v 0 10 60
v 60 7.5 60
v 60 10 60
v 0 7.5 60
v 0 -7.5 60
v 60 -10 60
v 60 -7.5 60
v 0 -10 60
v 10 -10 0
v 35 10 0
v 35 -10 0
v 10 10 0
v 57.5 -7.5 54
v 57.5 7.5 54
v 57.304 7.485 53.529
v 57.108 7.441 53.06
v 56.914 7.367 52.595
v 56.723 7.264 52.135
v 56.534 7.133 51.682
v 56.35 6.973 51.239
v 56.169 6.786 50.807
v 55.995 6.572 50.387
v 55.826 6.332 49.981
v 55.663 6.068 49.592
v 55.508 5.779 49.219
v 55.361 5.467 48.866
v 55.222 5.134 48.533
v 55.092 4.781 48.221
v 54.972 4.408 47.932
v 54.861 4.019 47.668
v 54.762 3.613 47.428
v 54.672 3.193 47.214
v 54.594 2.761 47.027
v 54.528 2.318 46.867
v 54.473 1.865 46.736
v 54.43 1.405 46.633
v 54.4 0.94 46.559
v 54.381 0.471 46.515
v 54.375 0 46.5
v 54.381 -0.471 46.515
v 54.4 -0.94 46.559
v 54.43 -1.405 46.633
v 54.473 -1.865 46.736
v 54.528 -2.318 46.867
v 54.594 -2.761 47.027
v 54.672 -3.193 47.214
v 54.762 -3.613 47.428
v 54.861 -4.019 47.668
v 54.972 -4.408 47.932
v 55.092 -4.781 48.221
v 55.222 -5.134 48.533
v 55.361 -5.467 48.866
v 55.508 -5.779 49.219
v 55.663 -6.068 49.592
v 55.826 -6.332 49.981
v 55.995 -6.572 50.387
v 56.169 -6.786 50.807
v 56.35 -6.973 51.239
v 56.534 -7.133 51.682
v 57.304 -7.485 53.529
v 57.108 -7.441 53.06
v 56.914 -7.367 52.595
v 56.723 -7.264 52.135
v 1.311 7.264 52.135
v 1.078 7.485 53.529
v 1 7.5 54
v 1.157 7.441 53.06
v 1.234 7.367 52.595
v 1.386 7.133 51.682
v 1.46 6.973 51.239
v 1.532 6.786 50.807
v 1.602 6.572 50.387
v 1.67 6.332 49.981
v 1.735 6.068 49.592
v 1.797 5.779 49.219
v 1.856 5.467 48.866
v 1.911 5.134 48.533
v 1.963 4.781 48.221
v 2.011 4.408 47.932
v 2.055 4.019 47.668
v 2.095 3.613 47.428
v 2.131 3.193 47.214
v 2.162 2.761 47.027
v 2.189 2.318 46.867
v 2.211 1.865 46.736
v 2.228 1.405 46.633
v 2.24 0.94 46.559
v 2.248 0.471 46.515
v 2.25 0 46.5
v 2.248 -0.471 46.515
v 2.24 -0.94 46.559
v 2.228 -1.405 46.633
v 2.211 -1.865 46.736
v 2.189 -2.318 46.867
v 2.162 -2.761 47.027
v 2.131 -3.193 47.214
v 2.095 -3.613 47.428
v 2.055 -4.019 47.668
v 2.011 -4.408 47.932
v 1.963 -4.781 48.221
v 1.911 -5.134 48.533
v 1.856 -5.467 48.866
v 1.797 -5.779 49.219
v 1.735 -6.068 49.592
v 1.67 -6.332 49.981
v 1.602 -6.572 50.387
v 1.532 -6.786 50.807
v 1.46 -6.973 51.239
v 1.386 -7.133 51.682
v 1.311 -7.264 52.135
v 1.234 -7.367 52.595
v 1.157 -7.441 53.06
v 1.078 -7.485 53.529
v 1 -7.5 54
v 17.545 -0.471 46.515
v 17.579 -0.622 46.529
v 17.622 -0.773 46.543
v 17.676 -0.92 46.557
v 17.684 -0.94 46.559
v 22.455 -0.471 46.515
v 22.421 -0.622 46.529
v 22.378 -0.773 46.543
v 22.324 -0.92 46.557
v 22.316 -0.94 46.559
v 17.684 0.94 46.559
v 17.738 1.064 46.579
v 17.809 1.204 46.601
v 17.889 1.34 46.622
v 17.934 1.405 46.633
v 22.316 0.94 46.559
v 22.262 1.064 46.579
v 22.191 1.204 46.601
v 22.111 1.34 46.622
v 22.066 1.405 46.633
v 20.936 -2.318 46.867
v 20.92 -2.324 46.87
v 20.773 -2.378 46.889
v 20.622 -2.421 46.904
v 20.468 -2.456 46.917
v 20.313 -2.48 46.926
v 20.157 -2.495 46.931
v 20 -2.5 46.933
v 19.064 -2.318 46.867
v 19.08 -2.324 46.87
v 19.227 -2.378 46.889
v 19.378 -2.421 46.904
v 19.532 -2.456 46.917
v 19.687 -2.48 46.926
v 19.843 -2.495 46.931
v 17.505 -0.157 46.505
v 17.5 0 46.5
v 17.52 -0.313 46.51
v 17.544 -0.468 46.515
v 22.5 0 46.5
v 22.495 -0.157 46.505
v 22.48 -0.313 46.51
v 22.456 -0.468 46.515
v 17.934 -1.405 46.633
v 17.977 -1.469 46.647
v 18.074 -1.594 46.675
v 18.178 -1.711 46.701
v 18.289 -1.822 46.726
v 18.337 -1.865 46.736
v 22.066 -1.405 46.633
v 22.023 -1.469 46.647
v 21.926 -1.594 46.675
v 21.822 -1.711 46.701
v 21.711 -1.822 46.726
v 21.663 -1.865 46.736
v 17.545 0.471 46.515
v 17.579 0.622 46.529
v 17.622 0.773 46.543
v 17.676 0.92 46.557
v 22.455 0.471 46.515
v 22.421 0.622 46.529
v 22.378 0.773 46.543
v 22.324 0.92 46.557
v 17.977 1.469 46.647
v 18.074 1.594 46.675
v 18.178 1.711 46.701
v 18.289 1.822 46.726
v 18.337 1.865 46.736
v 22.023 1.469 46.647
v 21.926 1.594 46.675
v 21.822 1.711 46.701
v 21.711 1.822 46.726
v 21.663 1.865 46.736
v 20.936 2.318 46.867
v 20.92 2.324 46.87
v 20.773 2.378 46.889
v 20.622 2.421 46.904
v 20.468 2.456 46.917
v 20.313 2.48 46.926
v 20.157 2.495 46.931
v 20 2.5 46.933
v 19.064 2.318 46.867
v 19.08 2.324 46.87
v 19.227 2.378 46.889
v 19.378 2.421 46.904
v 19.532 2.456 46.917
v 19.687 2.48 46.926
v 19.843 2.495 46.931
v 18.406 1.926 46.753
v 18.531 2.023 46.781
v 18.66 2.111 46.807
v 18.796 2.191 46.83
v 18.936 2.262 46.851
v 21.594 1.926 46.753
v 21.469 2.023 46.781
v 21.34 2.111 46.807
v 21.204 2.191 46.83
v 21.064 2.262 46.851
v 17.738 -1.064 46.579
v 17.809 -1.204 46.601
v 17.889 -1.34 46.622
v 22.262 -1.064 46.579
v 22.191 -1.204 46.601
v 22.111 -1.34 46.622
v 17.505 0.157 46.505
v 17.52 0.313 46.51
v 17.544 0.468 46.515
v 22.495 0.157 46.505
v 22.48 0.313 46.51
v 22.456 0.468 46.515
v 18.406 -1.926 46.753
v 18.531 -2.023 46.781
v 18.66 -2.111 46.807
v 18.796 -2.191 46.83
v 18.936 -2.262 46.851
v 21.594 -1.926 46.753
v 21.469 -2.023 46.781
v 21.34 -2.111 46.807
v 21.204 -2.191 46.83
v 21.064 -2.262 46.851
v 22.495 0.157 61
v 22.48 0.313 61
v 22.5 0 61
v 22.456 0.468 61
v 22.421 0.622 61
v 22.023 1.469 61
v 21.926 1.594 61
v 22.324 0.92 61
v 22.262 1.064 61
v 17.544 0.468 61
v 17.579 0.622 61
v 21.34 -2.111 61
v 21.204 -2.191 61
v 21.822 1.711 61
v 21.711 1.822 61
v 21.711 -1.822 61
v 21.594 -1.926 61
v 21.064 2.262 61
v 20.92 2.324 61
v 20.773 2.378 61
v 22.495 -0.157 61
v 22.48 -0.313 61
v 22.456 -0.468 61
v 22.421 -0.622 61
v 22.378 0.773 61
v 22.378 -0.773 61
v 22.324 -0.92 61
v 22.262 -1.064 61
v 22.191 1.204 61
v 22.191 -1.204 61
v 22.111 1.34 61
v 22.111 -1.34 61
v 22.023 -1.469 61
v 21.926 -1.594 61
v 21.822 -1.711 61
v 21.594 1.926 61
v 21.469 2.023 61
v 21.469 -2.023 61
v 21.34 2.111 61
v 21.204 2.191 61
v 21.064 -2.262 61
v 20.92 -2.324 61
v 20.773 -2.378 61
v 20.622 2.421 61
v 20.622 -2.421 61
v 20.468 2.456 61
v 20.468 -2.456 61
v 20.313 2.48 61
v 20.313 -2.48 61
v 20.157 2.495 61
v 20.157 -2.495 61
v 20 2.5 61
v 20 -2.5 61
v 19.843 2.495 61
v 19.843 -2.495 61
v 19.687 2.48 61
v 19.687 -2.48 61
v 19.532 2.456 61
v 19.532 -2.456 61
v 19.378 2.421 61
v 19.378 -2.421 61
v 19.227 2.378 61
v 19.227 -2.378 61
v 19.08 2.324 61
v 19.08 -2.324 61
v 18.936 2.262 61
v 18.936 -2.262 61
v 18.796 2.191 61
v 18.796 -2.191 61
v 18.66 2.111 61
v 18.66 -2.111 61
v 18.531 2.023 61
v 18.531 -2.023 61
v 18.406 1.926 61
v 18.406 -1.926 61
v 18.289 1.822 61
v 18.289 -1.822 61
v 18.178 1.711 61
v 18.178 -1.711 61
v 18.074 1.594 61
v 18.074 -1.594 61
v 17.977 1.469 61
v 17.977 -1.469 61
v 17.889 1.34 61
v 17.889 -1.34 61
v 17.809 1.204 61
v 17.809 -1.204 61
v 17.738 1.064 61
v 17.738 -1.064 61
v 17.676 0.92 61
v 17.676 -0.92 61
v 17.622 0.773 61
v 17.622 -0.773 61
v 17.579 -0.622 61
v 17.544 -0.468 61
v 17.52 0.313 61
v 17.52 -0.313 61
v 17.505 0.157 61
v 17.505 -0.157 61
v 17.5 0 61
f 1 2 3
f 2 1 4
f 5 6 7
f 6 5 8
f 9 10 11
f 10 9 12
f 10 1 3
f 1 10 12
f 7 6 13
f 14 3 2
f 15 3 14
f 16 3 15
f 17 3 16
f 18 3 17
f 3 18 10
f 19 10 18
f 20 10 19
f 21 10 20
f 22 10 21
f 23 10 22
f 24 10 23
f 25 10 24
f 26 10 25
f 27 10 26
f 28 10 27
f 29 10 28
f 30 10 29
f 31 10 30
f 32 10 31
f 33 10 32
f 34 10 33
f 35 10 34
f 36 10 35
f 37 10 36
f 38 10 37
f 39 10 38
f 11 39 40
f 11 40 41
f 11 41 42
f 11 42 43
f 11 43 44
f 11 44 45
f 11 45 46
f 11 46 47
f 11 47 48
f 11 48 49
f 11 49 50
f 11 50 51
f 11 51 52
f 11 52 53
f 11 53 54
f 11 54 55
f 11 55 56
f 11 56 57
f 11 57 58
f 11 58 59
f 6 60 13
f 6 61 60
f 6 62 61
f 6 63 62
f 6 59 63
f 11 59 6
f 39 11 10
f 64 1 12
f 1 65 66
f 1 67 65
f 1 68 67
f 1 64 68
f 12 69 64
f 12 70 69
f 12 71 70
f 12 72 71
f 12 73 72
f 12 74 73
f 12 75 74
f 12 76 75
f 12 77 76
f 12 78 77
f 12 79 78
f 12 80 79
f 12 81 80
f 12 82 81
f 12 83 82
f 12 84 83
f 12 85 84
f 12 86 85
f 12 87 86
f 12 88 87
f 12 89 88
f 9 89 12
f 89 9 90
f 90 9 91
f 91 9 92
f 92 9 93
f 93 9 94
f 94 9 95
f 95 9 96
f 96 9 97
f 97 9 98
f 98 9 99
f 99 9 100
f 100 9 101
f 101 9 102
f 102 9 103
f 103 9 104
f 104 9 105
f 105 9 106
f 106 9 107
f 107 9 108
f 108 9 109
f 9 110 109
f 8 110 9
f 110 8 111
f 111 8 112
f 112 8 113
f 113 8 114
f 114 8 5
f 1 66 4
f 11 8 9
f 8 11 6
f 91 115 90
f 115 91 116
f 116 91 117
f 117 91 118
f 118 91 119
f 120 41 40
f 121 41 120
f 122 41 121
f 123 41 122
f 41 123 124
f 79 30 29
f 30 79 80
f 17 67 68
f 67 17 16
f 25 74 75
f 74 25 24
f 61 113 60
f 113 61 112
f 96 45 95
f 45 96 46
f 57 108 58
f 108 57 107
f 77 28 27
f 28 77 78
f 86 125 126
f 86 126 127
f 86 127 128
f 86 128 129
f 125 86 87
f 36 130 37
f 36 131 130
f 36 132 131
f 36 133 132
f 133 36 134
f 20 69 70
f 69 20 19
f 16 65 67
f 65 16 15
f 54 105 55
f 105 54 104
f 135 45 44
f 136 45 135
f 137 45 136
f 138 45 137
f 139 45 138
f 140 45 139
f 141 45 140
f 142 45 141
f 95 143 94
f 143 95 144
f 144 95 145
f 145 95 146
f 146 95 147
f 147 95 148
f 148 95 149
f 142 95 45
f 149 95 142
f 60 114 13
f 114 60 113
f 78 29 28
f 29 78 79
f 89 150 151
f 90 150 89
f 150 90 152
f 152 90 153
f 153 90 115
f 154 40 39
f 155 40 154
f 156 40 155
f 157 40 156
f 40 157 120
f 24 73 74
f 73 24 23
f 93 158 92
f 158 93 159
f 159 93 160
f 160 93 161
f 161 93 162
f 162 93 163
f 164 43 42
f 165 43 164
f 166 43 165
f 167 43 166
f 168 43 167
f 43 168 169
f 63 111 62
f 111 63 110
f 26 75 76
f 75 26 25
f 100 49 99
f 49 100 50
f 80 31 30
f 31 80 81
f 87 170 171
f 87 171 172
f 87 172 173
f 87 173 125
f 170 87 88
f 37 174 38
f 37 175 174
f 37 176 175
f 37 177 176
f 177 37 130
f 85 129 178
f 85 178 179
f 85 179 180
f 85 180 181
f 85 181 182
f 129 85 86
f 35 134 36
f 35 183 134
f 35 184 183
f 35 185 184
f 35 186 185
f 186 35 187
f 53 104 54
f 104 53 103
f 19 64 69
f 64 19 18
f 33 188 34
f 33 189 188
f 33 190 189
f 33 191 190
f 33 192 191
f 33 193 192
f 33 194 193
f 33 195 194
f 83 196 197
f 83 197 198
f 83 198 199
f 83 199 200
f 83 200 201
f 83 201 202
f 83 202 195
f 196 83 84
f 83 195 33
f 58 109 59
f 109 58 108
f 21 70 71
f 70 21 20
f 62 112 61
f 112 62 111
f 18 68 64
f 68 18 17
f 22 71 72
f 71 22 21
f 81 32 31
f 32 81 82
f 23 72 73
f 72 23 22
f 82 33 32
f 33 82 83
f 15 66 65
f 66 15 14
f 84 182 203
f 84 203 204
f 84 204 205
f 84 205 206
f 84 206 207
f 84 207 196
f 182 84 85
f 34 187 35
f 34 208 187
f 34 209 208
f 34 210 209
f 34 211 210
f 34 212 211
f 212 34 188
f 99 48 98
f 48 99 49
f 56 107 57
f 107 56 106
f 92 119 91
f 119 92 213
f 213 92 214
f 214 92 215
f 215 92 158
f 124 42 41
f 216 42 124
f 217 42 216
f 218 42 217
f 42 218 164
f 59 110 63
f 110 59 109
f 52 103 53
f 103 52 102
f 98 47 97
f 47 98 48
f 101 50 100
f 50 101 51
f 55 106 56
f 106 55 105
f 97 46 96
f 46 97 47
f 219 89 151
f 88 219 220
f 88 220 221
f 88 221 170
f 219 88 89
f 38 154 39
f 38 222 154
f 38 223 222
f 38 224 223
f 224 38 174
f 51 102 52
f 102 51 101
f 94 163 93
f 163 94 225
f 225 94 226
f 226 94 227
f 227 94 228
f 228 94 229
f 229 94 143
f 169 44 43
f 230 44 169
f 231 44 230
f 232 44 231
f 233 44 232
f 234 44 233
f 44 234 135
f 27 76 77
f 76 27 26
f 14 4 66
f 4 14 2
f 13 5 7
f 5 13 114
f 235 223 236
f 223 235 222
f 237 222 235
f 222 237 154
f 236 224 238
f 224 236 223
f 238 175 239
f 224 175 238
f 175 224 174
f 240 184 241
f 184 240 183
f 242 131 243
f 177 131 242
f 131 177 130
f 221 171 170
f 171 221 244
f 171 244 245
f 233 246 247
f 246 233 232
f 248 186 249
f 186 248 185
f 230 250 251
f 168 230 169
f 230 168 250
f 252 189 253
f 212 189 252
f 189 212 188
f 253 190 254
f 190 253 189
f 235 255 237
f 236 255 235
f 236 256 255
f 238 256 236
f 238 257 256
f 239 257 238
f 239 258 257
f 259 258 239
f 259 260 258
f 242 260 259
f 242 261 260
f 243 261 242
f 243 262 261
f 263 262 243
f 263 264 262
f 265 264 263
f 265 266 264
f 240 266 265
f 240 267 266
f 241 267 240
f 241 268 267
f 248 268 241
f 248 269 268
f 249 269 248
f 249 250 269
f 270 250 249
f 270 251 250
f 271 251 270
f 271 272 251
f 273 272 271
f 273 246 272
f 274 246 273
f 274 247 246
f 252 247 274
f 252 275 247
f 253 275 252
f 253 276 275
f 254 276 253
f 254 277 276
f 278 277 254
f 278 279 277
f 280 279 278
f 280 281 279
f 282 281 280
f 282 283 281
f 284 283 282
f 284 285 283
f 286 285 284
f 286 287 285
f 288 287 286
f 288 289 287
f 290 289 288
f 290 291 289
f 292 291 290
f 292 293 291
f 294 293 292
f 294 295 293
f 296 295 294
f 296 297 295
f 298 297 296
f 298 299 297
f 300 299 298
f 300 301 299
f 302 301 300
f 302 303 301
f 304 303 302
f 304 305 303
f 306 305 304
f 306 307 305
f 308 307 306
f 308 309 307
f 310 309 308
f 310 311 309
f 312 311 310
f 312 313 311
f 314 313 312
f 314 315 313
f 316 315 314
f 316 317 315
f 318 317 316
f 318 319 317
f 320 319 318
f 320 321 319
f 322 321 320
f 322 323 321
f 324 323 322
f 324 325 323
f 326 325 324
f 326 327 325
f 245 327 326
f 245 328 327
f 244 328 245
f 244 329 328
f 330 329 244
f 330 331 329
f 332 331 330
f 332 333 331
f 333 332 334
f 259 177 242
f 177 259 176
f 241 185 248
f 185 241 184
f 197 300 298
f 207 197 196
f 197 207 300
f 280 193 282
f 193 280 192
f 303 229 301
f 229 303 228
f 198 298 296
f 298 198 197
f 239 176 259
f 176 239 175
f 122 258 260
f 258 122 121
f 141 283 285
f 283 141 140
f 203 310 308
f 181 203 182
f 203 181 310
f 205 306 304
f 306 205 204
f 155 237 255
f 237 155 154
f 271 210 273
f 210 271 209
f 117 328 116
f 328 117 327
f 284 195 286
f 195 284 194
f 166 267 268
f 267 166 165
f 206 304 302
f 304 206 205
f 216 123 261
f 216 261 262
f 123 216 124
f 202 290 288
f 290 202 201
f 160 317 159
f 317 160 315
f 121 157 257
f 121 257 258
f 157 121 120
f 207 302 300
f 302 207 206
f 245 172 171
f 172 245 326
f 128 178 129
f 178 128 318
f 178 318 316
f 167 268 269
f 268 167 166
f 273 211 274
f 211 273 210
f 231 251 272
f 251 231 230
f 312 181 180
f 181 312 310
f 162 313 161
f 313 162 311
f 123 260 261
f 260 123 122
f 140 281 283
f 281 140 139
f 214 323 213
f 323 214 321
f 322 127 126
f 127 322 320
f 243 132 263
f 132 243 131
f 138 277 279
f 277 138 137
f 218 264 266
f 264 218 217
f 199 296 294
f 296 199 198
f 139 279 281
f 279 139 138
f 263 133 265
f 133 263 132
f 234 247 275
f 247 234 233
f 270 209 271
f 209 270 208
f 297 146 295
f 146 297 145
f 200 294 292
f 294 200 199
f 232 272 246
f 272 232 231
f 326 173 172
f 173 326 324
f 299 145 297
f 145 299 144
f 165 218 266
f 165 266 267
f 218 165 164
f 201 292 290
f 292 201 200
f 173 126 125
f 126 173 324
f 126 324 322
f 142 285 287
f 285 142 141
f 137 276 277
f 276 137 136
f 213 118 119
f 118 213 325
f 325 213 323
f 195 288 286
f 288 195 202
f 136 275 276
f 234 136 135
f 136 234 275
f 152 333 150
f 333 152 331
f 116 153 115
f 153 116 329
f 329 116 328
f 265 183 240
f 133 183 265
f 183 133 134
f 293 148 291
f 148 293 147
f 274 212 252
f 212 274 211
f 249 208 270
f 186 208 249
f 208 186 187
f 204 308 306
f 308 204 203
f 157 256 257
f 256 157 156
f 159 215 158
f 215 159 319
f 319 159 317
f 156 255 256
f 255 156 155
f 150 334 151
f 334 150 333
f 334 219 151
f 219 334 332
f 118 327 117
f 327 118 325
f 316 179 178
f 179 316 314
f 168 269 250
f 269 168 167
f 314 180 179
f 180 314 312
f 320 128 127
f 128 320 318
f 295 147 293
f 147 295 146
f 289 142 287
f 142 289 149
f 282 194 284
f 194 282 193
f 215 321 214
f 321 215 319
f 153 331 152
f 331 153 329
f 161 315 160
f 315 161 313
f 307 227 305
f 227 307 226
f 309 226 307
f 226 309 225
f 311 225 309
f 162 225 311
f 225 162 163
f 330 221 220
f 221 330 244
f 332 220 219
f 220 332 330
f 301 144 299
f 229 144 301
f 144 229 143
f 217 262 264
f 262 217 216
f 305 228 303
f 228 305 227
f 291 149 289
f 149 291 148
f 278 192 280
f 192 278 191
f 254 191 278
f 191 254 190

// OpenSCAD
module polygone ()
{
	longueur_base = 35;
	epaisseur = 20;
  polyhedron
  (
		points=[[10,0,0], [longueur_base,0,0], [60,0,60], [00,00,60], 
[10,epaisseur,0], [longueur_base,epaisseur,0], [60,epaisseur,60], [0,epaisseur,60]],  
		triangles=[[0,3,1],[1,3,2],  // face avant
             [0,4,3],[4,7,3],  // face gauche
             [1,2,6],[1,6,5],  // face droite
             [4,5,7],[5,6,7],  // face arrière
             [0,1,4],[1,5,4],  // bas
             [3,7,6],[3,6,2]]  // haut
  		);
}

module step2 ()
{
  translate ([0,-10,0]) polygone ();
}

module step3 ()
{
	difference ()
	{
		step2 ();
		translate ([-5,0,54]) rotate ([90,0,90]) cylinder (r1=7.5, r2=7.5, h=80, $fn=100);
	}
}

module step4()
{
	difference ()
	{
		step3 ();
		translate ([0,-7.5,54]) cube([80,15,10]);
	}
}



step4 ();
translate ([20,0,45]) cylinder (r1=2.5, r2=2.5, h=16, $fn=100);
